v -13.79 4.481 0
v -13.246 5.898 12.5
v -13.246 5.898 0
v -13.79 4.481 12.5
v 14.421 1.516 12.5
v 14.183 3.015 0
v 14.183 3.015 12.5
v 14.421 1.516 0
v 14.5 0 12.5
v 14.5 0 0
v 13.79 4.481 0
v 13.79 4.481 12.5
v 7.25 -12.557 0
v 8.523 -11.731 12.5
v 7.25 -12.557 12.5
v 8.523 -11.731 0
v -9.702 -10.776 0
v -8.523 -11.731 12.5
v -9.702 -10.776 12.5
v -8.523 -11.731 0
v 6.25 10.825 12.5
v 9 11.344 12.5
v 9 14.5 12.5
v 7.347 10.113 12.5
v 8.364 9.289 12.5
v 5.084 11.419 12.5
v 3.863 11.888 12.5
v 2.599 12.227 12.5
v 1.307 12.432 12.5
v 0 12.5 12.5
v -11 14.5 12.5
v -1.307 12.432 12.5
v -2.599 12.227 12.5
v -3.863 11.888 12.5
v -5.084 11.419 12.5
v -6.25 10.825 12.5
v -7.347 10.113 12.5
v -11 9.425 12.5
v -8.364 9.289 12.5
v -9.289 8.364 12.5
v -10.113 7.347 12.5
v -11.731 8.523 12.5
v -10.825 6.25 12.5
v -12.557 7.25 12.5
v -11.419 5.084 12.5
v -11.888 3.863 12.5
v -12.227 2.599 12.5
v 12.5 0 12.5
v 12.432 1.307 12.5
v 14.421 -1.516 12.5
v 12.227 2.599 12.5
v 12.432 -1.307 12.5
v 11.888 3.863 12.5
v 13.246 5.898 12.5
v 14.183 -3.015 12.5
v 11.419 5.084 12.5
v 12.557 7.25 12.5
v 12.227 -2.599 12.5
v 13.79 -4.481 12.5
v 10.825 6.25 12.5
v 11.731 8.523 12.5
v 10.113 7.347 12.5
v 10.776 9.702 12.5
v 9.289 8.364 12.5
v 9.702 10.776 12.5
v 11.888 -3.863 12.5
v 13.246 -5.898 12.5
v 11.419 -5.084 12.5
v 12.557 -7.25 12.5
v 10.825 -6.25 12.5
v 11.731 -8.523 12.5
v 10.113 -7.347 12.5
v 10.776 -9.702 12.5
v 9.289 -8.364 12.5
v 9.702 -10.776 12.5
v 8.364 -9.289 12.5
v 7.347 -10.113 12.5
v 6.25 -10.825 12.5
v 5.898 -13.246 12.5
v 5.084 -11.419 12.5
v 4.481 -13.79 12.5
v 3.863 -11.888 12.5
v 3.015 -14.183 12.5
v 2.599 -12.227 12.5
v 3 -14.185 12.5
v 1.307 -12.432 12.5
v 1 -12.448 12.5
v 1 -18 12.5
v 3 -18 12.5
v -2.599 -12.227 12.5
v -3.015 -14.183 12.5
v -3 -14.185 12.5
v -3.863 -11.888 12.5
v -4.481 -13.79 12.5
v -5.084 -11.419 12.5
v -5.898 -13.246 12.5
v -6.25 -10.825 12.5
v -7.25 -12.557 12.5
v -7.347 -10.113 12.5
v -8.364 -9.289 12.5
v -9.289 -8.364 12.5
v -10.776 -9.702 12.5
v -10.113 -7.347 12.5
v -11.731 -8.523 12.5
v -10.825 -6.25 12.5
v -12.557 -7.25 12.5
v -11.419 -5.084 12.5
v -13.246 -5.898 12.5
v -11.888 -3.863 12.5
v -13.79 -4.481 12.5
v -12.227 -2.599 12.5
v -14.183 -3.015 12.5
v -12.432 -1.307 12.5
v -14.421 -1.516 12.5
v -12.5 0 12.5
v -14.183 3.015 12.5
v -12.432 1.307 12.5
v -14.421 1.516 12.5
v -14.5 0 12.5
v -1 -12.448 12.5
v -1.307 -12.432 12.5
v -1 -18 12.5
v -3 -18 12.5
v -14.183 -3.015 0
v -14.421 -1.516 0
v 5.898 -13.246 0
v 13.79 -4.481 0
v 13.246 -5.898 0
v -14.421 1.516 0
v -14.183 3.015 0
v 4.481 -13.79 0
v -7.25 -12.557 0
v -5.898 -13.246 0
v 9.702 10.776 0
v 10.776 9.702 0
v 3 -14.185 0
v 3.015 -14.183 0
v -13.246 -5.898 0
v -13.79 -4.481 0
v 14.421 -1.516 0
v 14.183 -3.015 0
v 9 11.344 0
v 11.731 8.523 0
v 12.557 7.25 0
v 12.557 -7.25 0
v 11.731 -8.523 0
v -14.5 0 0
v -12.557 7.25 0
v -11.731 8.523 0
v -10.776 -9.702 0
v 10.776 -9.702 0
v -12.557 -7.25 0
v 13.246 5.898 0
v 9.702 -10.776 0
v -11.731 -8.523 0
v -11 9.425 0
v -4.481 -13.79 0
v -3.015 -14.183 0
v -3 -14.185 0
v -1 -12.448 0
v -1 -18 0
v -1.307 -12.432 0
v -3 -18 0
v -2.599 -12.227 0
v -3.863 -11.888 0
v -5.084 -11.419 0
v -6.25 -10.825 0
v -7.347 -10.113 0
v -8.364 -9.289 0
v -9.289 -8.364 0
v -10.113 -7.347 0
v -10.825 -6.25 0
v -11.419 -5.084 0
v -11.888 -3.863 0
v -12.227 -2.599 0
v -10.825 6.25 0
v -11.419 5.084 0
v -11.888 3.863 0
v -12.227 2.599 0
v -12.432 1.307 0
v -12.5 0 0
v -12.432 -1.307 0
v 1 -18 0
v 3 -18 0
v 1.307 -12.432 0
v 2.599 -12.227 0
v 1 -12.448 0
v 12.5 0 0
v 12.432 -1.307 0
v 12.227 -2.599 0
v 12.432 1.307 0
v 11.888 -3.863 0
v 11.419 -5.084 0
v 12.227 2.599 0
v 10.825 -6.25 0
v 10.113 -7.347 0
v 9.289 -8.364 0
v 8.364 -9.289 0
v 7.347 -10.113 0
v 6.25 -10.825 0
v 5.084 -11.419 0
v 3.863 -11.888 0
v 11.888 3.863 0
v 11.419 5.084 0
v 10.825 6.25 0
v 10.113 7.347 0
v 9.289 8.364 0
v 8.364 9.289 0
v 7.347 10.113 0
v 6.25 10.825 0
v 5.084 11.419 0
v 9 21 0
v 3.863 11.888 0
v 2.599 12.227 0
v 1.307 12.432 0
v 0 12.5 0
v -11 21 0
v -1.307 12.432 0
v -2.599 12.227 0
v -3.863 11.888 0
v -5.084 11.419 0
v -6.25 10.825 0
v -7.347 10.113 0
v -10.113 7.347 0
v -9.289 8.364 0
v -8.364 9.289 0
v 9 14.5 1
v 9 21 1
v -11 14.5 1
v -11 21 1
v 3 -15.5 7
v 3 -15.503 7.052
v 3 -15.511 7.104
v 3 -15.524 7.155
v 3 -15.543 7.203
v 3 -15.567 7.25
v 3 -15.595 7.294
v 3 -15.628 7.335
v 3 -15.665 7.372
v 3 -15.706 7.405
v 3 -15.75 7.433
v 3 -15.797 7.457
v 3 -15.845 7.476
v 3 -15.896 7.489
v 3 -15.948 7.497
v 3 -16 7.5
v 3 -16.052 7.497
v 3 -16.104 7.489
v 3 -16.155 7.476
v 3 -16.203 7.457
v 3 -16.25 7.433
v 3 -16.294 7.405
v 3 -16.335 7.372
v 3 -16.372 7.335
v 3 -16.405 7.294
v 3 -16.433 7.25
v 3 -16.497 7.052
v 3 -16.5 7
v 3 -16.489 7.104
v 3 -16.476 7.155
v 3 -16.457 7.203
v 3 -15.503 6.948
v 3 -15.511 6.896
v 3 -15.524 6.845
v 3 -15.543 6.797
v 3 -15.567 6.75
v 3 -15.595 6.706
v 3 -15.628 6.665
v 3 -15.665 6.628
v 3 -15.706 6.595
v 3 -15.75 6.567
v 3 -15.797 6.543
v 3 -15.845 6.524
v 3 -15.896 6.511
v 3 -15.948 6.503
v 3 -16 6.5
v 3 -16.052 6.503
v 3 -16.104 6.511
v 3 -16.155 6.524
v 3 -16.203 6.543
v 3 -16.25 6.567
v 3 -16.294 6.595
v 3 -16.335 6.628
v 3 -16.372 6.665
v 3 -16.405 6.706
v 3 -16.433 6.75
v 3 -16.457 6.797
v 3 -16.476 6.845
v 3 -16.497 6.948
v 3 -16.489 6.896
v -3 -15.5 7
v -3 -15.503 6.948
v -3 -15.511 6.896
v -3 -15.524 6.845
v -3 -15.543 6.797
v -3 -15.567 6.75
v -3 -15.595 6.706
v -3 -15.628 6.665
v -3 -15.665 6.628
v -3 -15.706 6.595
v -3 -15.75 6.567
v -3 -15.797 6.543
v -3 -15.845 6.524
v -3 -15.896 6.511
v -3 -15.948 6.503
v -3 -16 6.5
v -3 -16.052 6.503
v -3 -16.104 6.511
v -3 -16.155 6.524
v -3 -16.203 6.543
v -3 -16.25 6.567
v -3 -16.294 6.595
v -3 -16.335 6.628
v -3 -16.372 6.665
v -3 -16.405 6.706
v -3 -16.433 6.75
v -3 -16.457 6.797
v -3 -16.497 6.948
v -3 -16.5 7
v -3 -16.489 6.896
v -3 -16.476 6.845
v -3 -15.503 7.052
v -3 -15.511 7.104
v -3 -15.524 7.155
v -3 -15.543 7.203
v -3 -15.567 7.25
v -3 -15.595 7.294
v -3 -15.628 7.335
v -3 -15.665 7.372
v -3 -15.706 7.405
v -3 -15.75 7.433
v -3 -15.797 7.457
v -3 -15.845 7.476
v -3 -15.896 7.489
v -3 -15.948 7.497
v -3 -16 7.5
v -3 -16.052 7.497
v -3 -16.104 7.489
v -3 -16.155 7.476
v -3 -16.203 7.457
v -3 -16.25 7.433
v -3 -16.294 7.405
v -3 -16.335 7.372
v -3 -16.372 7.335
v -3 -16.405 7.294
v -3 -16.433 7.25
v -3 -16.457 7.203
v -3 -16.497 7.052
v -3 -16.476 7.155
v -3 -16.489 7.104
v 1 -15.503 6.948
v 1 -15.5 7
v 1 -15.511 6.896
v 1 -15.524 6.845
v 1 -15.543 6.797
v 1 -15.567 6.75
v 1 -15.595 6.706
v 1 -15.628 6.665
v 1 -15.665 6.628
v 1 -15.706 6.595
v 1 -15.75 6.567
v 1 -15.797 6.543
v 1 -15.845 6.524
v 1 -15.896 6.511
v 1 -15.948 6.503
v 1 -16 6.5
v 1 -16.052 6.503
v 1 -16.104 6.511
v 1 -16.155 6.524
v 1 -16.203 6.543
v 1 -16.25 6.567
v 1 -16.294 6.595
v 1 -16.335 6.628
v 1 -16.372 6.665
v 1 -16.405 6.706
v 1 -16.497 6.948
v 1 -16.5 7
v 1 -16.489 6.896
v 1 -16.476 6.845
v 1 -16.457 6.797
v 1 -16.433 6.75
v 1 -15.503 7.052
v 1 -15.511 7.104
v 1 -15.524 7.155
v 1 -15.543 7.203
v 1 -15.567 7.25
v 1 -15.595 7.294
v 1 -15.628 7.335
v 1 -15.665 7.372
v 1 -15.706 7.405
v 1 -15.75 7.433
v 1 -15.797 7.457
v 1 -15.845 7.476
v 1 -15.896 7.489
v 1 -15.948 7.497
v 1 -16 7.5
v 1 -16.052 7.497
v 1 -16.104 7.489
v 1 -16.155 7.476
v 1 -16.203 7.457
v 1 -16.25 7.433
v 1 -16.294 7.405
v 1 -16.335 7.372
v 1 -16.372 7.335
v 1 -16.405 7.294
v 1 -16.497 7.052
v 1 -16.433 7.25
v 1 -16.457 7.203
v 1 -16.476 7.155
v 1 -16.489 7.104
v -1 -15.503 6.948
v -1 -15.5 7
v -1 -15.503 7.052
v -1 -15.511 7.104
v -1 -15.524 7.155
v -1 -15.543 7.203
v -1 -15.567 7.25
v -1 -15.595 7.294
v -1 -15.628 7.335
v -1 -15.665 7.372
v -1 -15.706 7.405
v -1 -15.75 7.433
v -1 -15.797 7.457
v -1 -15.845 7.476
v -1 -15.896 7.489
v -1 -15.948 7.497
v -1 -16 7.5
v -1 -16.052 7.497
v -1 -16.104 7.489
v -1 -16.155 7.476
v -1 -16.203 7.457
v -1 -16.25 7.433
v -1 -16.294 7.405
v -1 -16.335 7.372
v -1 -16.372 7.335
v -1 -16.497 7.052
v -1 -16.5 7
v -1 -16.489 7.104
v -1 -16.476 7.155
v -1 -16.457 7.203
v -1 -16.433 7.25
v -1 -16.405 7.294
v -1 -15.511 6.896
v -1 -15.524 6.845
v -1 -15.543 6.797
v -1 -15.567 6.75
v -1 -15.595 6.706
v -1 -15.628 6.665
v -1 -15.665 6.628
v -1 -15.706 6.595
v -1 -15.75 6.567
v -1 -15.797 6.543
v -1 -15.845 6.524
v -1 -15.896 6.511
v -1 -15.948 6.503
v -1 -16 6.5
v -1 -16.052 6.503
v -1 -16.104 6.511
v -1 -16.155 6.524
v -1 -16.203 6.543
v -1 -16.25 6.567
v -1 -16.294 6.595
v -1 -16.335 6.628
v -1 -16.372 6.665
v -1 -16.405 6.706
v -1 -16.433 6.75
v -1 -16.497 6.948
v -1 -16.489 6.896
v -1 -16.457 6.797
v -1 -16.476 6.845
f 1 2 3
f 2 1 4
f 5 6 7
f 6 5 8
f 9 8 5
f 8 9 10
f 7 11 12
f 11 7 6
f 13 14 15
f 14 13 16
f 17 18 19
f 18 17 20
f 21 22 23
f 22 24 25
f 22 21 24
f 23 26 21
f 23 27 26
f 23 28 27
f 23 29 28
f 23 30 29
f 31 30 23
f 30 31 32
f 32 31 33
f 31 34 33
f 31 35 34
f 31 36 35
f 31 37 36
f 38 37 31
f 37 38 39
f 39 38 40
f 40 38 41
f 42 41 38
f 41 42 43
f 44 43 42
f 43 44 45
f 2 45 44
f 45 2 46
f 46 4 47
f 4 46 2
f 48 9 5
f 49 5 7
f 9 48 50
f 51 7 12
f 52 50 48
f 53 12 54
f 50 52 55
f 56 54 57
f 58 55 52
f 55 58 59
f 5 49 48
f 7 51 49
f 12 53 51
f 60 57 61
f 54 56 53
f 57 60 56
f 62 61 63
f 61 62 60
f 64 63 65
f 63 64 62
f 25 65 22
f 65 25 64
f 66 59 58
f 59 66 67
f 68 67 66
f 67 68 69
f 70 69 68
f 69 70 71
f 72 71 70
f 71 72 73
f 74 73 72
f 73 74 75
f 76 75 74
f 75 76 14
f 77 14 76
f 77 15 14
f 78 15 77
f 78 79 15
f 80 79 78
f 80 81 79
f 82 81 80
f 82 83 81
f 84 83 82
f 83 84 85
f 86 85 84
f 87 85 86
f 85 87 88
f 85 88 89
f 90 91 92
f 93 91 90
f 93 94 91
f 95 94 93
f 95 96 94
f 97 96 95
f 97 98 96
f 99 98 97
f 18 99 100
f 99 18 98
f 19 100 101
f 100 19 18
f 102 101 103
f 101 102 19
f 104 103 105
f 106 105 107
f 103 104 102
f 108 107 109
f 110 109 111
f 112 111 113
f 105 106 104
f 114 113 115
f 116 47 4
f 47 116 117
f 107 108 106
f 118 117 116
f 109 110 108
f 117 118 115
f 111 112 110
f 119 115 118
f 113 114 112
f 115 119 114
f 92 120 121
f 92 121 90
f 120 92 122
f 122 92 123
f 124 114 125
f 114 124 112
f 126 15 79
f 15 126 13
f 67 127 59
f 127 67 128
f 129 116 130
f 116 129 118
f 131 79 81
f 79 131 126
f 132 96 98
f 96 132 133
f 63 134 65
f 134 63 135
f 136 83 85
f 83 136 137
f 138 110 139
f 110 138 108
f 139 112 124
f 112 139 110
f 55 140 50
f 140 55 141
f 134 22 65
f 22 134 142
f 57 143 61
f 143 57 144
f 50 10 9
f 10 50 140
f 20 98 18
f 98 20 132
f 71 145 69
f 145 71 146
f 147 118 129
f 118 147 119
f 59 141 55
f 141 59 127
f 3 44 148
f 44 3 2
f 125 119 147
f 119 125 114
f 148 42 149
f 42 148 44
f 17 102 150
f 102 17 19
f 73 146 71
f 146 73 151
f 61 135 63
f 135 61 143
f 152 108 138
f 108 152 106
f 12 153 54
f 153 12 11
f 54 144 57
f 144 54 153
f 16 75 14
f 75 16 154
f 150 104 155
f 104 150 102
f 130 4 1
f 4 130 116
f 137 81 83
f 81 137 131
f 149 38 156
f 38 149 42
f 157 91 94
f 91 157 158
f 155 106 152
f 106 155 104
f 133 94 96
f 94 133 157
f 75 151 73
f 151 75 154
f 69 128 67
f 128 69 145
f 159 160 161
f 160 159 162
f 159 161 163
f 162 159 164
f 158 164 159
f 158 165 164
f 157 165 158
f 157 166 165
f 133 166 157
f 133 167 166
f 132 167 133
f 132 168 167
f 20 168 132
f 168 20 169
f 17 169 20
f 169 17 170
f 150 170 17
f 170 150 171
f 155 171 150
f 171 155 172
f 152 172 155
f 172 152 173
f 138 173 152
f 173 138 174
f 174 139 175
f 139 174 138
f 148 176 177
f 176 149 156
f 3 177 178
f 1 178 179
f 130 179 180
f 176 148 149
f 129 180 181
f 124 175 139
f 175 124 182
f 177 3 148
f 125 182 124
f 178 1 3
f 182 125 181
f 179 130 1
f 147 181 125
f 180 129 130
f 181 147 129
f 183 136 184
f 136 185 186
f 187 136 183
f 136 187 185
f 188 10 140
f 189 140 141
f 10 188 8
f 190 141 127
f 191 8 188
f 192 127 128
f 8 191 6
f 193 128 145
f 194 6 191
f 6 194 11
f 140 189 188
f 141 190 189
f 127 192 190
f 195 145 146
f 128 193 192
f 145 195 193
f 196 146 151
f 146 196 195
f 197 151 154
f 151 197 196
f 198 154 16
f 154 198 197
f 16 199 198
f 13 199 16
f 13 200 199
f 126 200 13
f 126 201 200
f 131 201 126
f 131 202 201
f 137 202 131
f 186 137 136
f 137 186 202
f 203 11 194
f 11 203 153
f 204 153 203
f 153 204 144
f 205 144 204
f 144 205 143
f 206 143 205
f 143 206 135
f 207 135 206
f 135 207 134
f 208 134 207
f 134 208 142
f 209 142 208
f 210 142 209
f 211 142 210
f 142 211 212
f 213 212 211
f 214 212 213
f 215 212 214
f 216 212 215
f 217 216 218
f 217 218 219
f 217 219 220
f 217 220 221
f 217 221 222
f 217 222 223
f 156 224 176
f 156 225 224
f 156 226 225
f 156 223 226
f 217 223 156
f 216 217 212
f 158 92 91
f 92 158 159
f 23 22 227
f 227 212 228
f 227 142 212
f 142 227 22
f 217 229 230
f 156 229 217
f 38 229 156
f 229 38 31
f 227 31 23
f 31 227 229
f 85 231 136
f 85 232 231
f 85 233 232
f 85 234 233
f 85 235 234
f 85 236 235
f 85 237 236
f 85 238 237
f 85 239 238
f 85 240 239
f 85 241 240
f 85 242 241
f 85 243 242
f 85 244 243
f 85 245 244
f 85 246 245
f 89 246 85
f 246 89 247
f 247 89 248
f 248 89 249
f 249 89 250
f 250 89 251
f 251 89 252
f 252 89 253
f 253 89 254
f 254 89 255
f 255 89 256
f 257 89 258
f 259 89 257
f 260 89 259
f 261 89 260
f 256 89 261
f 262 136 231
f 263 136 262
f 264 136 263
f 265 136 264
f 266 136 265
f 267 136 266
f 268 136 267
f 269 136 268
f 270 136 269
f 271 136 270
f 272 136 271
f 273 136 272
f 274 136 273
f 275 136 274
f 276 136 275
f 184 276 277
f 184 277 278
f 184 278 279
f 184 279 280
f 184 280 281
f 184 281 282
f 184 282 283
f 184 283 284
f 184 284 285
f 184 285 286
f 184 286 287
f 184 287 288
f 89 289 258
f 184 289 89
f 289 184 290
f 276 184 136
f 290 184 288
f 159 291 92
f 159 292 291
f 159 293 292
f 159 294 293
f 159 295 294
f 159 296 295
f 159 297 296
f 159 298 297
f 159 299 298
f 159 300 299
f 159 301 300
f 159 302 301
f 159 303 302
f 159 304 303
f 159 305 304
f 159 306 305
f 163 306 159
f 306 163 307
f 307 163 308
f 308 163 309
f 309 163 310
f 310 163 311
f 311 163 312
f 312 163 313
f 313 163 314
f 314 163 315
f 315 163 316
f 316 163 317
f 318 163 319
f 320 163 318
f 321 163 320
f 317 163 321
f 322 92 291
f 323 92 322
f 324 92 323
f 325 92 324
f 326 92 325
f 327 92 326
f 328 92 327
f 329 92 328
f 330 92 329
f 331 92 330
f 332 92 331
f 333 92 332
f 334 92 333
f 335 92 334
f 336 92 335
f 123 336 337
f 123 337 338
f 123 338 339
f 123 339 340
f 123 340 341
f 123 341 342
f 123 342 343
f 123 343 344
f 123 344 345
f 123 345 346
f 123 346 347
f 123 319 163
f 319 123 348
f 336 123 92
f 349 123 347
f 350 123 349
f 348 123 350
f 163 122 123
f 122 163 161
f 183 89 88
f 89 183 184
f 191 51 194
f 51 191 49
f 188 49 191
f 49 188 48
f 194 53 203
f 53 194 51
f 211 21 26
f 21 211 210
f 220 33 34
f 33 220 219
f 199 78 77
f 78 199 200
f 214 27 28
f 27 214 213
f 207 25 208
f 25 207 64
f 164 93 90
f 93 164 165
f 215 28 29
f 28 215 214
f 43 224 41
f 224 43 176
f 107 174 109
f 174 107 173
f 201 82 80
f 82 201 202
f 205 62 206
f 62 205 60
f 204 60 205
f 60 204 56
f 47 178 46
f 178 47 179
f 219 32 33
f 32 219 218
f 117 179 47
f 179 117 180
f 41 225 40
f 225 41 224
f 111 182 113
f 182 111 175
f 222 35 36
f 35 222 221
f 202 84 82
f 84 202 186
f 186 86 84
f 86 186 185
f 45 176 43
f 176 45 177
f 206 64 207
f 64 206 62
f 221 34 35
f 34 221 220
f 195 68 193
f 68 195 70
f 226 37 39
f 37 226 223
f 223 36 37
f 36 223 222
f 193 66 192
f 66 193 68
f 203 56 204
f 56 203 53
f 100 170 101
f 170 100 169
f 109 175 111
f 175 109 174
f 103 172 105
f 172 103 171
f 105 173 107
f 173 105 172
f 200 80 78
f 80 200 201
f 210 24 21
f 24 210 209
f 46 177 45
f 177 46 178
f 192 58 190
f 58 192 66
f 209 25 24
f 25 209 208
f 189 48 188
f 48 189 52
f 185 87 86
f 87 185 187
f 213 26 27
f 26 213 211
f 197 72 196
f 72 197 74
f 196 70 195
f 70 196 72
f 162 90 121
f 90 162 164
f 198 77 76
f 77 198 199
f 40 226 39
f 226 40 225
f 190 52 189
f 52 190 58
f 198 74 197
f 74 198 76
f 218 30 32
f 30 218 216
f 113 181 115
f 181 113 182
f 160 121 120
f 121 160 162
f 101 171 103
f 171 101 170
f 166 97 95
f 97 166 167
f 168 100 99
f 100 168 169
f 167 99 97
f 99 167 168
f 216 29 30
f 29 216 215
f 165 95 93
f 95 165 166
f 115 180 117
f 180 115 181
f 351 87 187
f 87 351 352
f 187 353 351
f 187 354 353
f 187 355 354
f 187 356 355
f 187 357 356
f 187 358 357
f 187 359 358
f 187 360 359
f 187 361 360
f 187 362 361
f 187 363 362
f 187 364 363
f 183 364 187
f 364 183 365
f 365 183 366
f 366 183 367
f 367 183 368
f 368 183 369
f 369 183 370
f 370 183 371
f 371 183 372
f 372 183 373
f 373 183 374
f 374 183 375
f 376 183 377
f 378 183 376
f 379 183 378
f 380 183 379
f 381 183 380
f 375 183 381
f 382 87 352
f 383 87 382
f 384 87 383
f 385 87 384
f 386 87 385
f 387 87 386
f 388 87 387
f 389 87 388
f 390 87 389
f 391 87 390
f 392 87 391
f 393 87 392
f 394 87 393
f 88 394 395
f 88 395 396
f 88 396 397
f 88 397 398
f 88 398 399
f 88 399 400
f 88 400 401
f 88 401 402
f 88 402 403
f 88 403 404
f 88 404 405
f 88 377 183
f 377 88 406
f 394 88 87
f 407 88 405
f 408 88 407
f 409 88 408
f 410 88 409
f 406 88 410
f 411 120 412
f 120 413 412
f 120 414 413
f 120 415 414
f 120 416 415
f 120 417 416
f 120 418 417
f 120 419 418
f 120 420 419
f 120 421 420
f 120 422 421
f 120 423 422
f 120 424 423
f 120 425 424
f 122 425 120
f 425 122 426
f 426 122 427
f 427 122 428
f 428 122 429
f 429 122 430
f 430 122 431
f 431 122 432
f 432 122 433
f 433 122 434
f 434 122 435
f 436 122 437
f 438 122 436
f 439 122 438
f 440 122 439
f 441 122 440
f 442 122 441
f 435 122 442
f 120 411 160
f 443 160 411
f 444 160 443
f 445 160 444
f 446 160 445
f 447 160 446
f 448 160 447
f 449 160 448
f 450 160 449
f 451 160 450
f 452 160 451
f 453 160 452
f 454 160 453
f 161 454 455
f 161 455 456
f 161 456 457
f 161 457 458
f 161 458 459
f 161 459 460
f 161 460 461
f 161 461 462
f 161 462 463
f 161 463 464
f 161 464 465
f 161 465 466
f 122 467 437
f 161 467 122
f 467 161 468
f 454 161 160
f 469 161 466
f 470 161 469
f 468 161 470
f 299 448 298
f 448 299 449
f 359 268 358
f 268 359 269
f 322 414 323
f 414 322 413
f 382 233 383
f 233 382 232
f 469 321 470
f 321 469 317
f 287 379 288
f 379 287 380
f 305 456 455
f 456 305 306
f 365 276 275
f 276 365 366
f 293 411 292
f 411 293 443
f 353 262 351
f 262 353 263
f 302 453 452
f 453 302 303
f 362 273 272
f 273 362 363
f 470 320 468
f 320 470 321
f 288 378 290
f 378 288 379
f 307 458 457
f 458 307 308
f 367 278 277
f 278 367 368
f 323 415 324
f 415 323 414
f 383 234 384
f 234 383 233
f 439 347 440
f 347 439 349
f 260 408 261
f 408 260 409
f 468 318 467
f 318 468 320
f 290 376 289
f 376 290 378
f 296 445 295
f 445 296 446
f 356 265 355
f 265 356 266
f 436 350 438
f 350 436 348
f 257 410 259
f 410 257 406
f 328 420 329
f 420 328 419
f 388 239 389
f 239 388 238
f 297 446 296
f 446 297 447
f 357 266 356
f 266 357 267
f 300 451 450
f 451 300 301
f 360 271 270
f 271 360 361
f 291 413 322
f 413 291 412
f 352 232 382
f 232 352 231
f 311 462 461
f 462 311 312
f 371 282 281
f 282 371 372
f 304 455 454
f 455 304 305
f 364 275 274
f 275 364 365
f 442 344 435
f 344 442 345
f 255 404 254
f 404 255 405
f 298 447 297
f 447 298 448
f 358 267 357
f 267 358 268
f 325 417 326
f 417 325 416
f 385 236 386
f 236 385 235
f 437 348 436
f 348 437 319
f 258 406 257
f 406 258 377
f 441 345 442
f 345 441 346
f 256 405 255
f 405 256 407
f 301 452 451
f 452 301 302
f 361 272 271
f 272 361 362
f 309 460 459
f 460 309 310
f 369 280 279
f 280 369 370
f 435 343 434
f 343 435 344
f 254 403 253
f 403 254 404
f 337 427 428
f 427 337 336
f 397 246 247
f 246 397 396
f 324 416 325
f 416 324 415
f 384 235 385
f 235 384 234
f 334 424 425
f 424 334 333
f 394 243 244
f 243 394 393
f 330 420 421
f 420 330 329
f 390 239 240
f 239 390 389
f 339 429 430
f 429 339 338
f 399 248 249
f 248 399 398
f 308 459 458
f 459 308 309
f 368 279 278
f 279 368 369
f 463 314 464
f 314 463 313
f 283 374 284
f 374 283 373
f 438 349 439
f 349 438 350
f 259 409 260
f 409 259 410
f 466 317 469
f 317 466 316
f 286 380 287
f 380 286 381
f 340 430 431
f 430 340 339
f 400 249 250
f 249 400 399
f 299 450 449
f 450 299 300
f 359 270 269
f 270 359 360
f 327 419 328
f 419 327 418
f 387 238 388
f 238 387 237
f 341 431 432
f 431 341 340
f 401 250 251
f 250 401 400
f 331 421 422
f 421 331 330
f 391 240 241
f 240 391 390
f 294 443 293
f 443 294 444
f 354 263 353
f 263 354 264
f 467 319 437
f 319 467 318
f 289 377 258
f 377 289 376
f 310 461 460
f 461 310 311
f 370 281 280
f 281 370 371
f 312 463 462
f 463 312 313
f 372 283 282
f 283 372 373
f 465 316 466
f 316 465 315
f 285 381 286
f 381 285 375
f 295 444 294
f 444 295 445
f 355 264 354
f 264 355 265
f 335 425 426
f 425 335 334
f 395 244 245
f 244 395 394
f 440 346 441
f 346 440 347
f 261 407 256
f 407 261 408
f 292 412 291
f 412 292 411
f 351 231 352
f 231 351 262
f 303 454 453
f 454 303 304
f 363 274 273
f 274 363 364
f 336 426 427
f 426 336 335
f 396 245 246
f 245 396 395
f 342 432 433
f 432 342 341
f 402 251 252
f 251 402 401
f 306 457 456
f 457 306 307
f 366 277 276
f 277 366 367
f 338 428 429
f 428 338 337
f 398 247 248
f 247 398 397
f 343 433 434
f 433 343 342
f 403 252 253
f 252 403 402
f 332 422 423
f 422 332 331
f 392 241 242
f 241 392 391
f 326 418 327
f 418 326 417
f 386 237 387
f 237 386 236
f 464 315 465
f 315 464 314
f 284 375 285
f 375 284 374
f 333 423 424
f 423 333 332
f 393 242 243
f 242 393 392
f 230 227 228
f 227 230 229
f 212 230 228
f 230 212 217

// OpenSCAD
$fn=60;
difference() {
  union()  {
    cylinder(d=25+4,h=12.5);
    translate([-11,0,0])cube([20,29/2,12.5]);
    translate([-3,-18,0])cube([6,5,12.5]);
  }
  cylinder(d=25,h=12.5+4);
  translate([-1,-19,0])cube([2,7,13.5]);
  translate([-5,-16,7])rotate([0,90,0])cylinder(d=1,h=10);
}
translate([-11,13,0])cube([20,8,1]);
